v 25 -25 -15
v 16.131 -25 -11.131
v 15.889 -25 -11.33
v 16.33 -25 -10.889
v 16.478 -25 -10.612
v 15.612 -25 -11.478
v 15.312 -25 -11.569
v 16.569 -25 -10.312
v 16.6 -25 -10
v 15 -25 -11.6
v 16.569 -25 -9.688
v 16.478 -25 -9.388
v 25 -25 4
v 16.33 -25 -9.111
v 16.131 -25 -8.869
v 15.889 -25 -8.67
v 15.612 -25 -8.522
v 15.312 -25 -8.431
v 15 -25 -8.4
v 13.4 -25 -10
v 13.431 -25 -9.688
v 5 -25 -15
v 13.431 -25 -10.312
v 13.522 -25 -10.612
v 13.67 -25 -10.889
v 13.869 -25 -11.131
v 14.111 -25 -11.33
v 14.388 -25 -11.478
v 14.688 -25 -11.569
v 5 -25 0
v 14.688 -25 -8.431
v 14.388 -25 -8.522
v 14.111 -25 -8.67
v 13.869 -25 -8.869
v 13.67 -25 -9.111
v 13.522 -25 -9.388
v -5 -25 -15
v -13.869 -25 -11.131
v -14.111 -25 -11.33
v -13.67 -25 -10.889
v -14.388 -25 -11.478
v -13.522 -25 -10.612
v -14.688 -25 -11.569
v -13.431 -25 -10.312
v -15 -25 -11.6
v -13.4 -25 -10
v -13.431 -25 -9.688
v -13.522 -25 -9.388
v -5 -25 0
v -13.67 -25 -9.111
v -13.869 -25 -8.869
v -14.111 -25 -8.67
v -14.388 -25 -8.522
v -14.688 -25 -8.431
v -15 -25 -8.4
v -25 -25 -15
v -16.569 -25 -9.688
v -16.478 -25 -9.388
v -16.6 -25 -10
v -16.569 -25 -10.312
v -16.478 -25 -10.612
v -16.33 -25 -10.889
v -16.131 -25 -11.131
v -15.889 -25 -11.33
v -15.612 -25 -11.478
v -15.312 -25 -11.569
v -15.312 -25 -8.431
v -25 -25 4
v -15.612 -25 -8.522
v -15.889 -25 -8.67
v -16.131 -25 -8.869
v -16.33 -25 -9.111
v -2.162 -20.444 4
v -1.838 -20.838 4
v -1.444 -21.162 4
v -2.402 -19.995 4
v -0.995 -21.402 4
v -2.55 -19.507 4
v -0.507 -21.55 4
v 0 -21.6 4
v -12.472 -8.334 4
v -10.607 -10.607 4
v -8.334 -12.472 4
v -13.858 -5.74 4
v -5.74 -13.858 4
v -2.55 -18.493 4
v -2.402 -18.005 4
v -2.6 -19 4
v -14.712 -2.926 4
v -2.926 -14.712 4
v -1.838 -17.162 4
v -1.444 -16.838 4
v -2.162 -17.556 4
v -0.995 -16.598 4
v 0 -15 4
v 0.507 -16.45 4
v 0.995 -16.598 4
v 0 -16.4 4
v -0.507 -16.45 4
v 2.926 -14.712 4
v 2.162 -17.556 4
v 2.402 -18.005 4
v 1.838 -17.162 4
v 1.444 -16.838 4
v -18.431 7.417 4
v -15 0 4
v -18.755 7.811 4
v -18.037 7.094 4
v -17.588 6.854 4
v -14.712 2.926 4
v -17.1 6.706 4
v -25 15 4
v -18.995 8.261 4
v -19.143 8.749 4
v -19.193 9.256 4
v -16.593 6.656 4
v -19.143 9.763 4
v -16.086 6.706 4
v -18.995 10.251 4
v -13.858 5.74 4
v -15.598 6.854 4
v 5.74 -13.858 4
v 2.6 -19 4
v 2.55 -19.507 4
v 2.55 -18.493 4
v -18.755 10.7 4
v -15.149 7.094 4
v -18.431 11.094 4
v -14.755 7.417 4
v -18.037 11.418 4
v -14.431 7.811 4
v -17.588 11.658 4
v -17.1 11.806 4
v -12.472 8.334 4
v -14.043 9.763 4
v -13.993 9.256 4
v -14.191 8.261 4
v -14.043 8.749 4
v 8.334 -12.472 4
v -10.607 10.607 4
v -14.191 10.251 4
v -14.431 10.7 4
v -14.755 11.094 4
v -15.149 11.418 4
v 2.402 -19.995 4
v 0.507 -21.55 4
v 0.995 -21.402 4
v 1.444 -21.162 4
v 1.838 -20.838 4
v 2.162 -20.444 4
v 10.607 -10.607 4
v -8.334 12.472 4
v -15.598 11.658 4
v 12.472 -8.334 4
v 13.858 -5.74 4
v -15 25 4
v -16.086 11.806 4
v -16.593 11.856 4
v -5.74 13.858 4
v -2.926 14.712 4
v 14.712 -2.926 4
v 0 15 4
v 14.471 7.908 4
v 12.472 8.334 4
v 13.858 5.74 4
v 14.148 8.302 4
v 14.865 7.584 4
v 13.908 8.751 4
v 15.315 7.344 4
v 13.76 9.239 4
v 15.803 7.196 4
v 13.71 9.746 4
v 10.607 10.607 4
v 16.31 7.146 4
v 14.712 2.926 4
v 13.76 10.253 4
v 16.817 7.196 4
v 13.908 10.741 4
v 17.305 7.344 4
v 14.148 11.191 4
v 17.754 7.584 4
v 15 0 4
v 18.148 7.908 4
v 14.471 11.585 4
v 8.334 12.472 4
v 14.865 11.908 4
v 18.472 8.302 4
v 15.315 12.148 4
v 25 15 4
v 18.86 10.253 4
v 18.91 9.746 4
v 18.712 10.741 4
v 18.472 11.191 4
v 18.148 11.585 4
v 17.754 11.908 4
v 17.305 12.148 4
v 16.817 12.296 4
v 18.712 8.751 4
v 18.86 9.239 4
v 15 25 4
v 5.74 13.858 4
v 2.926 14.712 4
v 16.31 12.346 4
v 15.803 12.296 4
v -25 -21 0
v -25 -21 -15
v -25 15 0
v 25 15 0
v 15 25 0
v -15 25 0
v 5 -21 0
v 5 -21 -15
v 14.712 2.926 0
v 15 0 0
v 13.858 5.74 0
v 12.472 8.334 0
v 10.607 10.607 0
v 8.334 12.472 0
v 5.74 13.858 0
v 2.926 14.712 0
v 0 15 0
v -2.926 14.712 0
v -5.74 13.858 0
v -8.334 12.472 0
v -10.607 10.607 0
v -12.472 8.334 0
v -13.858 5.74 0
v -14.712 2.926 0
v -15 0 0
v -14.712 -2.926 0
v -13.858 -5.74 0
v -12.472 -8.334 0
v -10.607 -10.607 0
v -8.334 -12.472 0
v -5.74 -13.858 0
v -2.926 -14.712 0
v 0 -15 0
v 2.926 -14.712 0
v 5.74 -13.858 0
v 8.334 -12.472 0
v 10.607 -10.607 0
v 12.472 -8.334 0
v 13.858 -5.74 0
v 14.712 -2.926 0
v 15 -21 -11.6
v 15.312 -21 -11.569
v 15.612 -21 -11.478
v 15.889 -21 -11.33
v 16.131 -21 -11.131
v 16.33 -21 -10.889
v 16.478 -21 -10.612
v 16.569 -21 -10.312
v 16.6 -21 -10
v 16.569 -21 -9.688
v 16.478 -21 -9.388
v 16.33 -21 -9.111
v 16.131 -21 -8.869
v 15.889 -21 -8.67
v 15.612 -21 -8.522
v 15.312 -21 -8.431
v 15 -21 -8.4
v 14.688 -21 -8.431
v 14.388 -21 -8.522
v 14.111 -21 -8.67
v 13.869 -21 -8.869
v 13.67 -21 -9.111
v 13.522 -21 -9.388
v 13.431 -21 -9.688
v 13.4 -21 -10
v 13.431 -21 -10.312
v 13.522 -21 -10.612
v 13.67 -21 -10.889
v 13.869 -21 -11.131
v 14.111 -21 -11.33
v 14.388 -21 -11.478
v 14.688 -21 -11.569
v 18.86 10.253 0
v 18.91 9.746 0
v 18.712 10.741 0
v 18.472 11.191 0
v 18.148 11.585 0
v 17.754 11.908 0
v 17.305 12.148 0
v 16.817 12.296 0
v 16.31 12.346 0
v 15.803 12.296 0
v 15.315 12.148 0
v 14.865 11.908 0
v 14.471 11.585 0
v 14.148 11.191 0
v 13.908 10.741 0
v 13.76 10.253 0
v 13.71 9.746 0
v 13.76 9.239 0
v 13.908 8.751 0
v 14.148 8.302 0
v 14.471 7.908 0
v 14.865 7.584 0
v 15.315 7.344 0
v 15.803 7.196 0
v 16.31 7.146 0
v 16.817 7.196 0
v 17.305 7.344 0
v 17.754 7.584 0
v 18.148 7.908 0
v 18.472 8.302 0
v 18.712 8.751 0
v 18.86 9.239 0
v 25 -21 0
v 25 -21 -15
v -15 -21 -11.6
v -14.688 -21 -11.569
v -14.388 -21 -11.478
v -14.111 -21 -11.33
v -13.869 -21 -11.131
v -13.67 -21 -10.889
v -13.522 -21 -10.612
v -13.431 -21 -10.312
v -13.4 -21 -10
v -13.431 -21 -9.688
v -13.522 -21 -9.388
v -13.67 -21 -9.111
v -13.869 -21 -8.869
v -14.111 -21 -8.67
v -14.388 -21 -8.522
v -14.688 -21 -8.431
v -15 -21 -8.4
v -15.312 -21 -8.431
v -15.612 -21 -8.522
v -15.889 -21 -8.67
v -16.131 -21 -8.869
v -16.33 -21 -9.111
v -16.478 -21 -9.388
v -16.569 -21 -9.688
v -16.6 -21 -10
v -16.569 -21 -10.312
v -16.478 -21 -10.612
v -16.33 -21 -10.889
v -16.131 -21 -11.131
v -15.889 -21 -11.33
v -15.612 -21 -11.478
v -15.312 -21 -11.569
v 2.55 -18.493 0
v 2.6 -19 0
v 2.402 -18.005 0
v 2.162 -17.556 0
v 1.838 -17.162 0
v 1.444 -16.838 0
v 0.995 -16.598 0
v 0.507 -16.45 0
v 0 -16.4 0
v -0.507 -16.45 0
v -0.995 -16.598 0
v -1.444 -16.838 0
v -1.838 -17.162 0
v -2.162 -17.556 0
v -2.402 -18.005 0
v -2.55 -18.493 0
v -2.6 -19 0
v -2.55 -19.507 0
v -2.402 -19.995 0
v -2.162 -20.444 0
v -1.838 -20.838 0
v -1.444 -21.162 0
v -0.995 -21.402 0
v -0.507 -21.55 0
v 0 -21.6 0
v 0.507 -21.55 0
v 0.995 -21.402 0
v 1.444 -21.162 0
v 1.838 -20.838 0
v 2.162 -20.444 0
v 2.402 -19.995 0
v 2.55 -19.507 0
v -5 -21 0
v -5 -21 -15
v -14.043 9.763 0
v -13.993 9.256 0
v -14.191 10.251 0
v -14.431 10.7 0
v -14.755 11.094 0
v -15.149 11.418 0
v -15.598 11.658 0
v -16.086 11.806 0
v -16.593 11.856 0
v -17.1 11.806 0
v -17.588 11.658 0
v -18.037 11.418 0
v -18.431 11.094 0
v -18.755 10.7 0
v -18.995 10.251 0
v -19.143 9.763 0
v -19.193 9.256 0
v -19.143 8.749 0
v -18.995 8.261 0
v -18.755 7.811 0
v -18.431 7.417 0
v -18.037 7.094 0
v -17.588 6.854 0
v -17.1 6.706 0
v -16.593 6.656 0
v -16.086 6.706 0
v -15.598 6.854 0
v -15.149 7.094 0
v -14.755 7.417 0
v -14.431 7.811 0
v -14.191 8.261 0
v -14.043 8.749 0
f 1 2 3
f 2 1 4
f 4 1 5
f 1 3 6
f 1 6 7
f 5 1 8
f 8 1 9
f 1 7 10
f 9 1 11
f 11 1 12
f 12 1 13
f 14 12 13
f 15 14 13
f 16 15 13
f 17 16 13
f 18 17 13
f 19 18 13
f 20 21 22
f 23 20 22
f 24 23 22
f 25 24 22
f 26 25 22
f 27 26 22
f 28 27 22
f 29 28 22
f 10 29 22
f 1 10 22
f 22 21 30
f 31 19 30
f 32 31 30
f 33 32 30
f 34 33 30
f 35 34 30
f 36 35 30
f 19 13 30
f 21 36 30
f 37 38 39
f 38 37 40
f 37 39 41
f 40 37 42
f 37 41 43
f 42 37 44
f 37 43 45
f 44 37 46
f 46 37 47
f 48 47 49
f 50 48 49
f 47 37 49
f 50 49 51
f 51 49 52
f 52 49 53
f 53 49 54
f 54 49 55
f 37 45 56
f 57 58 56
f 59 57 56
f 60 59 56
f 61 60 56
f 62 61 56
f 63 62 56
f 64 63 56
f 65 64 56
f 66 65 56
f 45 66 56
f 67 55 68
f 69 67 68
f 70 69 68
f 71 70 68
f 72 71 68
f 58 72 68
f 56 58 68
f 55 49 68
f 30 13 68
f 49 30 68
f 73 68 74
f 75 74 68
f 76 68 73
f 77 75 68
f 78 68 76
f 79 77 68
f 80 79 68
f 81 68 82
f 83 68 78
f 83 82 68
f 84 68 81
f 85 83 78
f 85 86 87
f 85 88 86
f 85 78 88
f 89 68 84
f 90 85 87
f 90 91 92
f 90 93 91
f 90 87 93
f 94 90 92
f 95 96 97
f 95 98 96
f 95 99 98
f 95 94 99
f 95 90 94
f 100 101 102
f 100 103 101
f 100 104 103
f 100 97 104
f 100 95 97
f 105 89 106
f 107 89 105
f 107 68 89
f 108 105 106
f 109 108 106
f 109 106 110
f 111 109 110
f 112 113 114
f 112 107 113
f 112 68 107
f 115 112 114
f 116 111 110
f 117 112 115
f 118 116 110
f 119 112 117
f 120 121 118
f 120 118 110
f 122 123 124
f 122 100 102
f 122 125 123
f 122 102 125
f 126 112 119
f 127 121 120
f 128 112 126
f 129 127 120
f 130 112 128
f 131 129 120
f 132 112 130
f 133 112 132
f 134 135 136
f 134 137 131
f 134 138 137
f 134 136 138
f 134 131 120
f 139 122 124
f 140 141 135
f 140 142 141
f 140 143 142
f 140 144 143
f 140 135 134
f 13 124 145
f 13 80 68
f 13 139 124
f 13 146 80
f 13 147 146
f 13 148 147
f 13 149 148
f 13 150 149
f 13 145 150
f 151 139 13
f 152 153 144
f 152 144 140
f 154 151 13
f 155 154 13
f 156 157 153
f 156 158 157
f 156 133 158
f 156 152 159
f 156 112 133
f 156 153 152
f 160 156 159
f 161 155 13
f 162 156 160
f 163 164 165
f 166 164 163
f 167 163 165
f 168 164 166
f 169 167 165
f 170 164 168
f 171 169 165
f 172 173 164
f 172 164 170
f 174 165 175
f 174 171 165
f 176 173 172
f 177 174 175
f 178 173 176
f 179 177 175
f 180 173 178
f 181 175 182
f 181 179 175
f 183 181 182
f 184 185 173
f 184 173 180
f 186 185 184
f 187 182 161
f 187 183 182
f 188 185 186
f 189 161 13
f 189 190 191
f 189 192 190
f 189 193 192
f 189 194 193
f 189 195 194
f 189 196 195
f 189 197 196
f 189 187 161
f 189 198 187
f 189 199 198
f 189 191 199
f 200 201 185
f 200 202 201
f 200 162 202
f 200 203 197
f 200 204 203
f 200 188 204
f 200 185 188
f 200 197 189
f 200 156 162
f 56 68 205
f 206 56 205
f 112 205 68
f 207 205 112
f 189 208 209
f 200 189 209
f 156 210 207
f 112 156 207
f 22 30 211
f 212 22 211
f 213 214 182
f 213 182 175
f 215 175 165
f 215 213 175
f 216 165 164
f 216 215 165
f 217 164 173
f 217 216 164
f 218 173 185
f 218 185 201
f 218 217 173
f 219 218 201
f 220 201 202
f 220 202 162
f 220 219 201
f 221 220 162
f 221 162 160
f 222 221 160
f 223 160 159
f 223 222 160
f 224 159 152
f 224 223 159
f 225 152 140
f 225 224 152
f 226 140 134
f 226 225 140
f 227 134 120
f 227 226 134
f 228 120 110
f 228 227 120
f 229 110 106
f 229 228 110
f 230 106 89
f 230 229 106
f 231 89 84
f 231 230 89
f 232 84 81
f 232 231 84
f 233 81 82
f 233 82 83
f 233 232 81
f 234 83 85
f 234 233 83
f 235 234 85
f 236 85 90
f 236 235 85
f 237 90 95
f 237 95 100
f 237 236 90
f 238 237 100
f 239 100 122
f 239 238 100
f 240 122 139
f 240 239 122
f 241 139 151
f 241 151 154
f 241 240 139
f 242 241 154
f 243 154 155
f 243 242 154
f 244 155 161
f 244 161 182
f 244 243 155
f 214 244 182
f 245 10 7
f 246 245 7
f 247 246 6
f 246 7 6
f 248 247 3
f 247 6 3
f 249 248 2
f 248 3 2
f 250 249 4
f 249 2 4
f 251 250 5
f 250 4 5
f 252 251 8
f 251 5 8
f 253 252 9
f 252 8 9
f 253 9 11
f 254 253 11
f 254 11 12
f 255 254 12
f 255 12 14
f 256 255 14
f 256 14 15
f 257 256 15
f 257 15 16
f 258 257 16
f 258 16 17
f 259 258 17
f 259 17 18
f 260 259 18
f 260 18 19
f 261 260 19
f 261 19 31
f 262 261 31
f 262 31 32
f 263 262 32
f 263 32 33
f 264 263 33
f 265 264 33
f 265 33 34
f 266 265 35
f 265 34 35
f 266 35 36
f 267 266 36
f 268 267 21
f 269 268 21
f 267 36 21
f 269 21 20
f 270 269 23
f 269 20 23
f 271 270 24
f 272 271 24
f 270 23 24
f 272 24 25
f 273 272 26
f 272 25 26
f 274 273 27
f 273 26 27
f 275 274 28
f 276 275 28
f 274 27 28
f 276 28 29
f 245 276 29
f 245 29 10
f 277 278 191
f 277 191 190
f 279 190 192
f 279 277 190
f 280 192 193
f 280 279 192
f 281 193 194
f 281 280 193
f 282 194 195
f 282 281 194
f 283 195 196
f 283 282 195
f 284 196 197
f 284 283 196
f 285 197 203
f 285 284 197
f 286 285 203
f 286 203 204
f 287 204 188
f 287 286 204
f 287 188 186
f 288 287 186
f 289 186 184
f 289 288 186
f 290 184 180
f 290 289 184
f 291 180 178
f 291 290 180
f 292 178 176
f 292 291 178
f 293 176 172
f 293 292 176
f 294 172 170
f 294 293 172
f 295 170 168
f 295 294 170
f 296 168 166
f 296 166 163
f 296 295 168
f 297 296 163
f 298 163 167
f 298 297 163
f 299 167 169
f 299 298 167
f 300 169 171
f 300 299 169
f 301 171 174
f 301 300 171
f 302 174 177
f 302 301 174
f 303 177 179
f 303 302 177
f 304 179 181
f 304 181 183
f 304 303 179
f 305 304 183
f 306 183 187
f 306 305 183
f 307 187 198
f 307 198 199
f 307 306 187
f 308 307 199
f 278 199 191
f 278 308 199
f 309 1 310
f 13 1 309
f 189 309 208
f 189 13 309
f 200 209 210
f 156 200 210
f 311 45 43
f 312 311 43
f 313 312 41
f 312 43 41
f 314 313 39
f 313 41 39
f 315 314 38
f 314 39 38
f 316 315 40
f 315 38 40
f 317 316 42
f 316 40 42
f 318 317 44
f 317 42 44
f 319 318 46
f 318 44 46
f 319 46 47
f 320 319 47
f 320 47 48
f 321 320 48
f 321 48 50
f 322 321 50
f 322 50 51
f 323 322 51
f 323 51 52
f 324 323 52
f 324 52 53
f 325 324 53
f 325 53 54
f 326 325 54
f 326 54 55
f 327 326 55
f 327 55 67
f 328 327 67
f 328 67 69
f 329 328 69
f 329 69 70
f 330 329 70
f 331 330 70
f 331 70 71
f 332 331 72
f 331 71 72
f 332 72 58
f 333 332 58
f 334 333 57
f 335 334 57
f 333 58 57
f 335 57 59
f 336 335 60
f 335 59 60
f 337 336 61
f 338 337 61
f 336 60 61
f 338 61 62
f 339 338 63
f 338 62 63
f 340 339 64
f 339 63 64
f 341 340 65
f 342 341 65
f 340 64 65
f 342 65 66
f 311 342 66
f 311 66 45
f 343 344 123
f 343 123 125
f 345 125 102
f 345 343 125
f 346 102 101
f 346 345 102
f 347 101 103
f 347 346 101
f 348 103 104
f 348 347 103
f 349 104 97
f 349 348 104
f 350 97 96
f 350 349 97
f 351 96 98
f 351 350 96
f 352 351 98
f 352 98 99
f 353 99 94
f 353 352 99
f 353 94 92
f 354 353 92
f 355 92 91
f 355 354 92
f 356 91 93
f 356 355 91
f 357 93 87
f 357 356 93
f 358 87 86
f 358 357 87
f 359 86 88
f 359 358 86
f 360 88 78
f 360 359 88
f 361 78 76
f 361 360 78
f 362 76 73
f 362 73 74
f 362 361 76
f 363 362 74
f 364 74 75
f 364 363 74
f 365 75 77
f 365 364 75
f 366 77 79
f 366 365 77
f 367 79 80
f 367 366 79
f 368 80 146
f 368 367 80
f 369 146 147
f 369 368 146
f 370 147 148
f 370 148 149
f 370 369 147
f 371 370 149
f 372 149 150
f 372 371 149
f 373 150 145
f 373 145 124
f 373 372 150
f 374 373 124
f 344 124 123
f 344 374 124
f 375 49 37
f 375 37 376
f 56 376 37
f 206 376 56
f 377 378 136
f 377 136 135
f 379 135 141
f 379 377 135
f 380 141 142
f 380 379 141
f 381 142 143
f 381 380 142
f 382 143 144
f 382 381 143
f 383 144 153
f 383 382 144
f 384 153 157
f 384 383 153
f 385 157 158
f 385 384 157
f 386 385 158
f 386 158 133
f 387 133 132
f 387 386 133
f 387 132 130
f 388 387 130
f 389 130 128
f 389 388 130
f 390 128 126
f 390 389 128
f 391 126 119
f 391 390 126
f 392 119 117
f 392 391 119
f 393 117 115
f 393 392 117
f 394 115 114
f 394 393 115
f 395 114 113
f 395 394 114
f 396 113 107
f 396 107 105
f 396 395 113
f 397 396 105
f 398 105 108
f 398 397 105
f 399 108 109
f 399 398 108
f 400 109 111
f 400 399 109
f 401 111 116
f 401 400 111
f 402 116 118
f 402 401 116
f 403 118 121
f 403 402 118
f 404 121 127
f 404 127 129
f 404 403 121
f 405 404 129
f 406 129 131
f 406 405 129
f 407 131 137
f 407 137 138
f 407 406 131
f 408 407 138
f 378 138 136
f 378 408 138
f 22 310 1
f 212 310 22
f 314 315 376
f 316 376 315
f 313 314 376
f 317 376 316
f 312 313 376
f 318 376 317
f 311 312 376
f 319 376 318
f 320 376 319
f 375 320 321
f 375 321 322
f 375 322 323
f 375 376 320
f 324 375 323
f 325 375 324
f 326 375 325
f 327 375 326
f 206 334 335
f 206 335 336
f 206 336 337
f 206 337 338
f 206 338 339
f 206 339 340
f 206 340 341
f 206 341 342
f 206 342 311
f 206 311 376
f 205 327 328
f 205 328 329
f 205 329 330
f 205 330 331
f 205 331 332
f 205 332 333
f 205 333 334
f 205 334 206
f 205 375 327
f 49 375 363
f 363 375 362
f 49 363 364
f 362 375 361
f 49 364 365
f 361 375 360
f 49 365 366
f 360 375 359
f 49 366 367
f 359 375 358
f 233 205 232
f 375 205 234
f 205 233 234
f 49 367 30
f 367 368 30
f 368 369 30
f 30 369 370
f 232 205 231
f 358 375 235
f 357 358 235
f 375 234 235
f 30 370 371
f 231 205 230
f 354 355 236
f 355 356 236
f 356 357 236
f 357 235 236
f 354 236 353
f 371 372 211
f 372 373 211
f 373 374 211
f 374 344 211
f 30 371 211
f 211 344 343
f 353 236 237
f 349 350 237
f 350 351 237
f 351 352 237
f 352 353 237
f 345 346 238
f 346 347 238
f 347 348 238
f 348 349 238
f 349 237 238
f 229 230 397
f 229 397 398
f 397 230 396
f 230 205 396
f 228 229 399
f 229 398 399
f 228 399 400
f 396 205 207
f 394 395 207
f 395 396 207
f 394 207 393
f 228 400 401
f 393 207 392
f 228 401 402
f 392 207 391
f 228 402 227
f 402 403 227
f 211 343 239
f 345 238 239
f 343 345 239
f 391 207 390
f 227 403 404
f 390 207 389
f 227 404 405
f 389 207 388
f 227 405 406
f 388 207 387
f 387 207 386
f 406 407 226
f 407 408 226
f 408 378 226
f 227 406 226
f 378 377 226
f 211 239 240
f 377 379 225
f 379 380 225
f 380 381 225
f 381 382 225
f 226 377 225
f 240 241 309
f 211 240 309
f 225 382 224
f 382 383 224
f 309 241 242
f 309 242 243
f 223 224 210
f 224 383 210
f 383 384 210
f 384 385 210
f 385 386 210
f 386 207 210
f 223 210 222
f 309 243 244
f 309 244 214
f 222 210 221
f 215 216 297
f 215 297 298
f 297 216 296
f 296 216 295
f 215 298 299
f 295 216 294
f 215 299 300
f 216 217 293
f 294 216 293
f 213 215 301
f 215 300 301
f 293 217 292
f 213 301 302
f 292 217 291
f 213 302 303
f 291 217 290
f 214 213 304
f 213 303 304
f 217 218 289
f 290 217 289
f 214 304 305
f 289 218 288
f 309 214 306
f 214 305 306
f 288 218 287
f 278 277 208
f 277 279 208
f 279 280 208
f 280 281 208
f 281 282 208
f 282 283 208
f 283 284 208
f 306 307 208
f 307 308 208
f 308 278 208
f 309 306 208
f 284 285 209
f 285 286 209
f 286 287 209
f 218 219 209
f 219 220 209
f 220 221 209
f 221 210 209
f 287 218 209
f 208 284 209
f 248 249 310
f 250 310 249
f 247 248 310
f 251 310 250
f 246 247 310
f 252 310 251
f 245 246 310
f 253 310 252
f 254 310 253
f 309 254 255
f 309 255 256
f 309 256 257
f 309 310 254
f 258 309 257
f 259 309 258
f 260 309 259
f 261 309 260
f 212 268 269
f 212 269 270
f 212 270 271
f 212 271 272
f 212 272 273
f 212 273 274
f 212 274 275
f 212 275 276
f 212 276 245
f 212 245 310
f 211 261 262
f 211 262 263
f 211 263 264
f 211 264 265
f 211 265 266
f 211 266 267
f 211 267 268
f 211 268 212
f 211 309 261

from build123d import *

# Parameters (mm, degrees)
SKETCH_1_R          = 2.6
SKETCH_1_R_2        = 15
SKETCH_1_W          = 20
SKETCH_1_H          = 4
EXTRUDE_1_DEPTH     = 4
SKETCH_3_W          = 20
SKETCH_3_H          = 4
EXTRUDE_2_DEPTH     = 15
SKETCH_4_R          = 1.6
CUT_EXTRUDE_1_DEPTH = 15


with BuildPart() as part:
    # 草图1 → 凸台-拉伸1 (new body)
    # profile 1 of 3: a face of its own
    with BuildSketch(Plane.XY):
        Polygon((-25, 15), (-25, 0), (-25, -21), (-5, -21), (-5, -25), (5, -25), (5, -21), (25, -21), (25, 0), (25, 15), (15, 25), (0, 25), (-15, 25), align=None)
        with Locations((0, -19)):
            Circle(SKETCH_1_R, mode=Mode.SUBTRACT)
        Circle(SKETCH_1_R_2, mode=Mode.SUBTRACT)
        with Locations((-16.592996047, 9.255943073)):
            Circle(SKETCH_1_R, mode=Mode.SUBTRACT)
        with Locations((16.309882981, 9.746164228)):
            Circle(SKETCH_1_R, mode=Mode.SUBTRACT)
    # profile 2 of 3: a face of its own
    with BuildSketch(Plane.XY):
        with Locations((15, -23)):
            Rectangle(SKETCH_1_W, SKETCH_1_H)
    # profile 3 of 3: a face of its own
    with BuildSketch(Plane.XY):
        with Locations((-15, -23)):
            Rectangle(SKETCH_1_W, SKETCH_1_H)
    extrude(amount=EXTRUDE_1_DEPTH)

    # 草图3 → 凸台-拉伸2 (add)
    with BuildSketch(Plane(origin=(0, 0, 0), x_dir=(-1, 0, 0), z_dir=(0, 0, -1))):
        with Locations((-15, -23)):
            Rectangle(SKETCH_3_W, SKETCH_3_H)
        with Locations((15, -23)):
            Rectangle(SKETCH_3_W, SKETCH_3_H)
    extrude(amount=EXTRUDE_2_DEPTH)

    # 草图4 → 切除-拉伸1 (cut)
    with BuildSketch(Plane.XZ.offset(25)):
        with Locations(Location((-15, -10, 0), (0, 0, 270))):
            Circle(SKETCH_4_R)
        with Locations(Location((15, -10, 0), (0, 0, 270))):
            Circle(SKETCH_4_R)
    extrude(amount=-CUT_EXTRUDE_1_DEPTH, mode=Mode.SUBTRACT)


solid = part.part
